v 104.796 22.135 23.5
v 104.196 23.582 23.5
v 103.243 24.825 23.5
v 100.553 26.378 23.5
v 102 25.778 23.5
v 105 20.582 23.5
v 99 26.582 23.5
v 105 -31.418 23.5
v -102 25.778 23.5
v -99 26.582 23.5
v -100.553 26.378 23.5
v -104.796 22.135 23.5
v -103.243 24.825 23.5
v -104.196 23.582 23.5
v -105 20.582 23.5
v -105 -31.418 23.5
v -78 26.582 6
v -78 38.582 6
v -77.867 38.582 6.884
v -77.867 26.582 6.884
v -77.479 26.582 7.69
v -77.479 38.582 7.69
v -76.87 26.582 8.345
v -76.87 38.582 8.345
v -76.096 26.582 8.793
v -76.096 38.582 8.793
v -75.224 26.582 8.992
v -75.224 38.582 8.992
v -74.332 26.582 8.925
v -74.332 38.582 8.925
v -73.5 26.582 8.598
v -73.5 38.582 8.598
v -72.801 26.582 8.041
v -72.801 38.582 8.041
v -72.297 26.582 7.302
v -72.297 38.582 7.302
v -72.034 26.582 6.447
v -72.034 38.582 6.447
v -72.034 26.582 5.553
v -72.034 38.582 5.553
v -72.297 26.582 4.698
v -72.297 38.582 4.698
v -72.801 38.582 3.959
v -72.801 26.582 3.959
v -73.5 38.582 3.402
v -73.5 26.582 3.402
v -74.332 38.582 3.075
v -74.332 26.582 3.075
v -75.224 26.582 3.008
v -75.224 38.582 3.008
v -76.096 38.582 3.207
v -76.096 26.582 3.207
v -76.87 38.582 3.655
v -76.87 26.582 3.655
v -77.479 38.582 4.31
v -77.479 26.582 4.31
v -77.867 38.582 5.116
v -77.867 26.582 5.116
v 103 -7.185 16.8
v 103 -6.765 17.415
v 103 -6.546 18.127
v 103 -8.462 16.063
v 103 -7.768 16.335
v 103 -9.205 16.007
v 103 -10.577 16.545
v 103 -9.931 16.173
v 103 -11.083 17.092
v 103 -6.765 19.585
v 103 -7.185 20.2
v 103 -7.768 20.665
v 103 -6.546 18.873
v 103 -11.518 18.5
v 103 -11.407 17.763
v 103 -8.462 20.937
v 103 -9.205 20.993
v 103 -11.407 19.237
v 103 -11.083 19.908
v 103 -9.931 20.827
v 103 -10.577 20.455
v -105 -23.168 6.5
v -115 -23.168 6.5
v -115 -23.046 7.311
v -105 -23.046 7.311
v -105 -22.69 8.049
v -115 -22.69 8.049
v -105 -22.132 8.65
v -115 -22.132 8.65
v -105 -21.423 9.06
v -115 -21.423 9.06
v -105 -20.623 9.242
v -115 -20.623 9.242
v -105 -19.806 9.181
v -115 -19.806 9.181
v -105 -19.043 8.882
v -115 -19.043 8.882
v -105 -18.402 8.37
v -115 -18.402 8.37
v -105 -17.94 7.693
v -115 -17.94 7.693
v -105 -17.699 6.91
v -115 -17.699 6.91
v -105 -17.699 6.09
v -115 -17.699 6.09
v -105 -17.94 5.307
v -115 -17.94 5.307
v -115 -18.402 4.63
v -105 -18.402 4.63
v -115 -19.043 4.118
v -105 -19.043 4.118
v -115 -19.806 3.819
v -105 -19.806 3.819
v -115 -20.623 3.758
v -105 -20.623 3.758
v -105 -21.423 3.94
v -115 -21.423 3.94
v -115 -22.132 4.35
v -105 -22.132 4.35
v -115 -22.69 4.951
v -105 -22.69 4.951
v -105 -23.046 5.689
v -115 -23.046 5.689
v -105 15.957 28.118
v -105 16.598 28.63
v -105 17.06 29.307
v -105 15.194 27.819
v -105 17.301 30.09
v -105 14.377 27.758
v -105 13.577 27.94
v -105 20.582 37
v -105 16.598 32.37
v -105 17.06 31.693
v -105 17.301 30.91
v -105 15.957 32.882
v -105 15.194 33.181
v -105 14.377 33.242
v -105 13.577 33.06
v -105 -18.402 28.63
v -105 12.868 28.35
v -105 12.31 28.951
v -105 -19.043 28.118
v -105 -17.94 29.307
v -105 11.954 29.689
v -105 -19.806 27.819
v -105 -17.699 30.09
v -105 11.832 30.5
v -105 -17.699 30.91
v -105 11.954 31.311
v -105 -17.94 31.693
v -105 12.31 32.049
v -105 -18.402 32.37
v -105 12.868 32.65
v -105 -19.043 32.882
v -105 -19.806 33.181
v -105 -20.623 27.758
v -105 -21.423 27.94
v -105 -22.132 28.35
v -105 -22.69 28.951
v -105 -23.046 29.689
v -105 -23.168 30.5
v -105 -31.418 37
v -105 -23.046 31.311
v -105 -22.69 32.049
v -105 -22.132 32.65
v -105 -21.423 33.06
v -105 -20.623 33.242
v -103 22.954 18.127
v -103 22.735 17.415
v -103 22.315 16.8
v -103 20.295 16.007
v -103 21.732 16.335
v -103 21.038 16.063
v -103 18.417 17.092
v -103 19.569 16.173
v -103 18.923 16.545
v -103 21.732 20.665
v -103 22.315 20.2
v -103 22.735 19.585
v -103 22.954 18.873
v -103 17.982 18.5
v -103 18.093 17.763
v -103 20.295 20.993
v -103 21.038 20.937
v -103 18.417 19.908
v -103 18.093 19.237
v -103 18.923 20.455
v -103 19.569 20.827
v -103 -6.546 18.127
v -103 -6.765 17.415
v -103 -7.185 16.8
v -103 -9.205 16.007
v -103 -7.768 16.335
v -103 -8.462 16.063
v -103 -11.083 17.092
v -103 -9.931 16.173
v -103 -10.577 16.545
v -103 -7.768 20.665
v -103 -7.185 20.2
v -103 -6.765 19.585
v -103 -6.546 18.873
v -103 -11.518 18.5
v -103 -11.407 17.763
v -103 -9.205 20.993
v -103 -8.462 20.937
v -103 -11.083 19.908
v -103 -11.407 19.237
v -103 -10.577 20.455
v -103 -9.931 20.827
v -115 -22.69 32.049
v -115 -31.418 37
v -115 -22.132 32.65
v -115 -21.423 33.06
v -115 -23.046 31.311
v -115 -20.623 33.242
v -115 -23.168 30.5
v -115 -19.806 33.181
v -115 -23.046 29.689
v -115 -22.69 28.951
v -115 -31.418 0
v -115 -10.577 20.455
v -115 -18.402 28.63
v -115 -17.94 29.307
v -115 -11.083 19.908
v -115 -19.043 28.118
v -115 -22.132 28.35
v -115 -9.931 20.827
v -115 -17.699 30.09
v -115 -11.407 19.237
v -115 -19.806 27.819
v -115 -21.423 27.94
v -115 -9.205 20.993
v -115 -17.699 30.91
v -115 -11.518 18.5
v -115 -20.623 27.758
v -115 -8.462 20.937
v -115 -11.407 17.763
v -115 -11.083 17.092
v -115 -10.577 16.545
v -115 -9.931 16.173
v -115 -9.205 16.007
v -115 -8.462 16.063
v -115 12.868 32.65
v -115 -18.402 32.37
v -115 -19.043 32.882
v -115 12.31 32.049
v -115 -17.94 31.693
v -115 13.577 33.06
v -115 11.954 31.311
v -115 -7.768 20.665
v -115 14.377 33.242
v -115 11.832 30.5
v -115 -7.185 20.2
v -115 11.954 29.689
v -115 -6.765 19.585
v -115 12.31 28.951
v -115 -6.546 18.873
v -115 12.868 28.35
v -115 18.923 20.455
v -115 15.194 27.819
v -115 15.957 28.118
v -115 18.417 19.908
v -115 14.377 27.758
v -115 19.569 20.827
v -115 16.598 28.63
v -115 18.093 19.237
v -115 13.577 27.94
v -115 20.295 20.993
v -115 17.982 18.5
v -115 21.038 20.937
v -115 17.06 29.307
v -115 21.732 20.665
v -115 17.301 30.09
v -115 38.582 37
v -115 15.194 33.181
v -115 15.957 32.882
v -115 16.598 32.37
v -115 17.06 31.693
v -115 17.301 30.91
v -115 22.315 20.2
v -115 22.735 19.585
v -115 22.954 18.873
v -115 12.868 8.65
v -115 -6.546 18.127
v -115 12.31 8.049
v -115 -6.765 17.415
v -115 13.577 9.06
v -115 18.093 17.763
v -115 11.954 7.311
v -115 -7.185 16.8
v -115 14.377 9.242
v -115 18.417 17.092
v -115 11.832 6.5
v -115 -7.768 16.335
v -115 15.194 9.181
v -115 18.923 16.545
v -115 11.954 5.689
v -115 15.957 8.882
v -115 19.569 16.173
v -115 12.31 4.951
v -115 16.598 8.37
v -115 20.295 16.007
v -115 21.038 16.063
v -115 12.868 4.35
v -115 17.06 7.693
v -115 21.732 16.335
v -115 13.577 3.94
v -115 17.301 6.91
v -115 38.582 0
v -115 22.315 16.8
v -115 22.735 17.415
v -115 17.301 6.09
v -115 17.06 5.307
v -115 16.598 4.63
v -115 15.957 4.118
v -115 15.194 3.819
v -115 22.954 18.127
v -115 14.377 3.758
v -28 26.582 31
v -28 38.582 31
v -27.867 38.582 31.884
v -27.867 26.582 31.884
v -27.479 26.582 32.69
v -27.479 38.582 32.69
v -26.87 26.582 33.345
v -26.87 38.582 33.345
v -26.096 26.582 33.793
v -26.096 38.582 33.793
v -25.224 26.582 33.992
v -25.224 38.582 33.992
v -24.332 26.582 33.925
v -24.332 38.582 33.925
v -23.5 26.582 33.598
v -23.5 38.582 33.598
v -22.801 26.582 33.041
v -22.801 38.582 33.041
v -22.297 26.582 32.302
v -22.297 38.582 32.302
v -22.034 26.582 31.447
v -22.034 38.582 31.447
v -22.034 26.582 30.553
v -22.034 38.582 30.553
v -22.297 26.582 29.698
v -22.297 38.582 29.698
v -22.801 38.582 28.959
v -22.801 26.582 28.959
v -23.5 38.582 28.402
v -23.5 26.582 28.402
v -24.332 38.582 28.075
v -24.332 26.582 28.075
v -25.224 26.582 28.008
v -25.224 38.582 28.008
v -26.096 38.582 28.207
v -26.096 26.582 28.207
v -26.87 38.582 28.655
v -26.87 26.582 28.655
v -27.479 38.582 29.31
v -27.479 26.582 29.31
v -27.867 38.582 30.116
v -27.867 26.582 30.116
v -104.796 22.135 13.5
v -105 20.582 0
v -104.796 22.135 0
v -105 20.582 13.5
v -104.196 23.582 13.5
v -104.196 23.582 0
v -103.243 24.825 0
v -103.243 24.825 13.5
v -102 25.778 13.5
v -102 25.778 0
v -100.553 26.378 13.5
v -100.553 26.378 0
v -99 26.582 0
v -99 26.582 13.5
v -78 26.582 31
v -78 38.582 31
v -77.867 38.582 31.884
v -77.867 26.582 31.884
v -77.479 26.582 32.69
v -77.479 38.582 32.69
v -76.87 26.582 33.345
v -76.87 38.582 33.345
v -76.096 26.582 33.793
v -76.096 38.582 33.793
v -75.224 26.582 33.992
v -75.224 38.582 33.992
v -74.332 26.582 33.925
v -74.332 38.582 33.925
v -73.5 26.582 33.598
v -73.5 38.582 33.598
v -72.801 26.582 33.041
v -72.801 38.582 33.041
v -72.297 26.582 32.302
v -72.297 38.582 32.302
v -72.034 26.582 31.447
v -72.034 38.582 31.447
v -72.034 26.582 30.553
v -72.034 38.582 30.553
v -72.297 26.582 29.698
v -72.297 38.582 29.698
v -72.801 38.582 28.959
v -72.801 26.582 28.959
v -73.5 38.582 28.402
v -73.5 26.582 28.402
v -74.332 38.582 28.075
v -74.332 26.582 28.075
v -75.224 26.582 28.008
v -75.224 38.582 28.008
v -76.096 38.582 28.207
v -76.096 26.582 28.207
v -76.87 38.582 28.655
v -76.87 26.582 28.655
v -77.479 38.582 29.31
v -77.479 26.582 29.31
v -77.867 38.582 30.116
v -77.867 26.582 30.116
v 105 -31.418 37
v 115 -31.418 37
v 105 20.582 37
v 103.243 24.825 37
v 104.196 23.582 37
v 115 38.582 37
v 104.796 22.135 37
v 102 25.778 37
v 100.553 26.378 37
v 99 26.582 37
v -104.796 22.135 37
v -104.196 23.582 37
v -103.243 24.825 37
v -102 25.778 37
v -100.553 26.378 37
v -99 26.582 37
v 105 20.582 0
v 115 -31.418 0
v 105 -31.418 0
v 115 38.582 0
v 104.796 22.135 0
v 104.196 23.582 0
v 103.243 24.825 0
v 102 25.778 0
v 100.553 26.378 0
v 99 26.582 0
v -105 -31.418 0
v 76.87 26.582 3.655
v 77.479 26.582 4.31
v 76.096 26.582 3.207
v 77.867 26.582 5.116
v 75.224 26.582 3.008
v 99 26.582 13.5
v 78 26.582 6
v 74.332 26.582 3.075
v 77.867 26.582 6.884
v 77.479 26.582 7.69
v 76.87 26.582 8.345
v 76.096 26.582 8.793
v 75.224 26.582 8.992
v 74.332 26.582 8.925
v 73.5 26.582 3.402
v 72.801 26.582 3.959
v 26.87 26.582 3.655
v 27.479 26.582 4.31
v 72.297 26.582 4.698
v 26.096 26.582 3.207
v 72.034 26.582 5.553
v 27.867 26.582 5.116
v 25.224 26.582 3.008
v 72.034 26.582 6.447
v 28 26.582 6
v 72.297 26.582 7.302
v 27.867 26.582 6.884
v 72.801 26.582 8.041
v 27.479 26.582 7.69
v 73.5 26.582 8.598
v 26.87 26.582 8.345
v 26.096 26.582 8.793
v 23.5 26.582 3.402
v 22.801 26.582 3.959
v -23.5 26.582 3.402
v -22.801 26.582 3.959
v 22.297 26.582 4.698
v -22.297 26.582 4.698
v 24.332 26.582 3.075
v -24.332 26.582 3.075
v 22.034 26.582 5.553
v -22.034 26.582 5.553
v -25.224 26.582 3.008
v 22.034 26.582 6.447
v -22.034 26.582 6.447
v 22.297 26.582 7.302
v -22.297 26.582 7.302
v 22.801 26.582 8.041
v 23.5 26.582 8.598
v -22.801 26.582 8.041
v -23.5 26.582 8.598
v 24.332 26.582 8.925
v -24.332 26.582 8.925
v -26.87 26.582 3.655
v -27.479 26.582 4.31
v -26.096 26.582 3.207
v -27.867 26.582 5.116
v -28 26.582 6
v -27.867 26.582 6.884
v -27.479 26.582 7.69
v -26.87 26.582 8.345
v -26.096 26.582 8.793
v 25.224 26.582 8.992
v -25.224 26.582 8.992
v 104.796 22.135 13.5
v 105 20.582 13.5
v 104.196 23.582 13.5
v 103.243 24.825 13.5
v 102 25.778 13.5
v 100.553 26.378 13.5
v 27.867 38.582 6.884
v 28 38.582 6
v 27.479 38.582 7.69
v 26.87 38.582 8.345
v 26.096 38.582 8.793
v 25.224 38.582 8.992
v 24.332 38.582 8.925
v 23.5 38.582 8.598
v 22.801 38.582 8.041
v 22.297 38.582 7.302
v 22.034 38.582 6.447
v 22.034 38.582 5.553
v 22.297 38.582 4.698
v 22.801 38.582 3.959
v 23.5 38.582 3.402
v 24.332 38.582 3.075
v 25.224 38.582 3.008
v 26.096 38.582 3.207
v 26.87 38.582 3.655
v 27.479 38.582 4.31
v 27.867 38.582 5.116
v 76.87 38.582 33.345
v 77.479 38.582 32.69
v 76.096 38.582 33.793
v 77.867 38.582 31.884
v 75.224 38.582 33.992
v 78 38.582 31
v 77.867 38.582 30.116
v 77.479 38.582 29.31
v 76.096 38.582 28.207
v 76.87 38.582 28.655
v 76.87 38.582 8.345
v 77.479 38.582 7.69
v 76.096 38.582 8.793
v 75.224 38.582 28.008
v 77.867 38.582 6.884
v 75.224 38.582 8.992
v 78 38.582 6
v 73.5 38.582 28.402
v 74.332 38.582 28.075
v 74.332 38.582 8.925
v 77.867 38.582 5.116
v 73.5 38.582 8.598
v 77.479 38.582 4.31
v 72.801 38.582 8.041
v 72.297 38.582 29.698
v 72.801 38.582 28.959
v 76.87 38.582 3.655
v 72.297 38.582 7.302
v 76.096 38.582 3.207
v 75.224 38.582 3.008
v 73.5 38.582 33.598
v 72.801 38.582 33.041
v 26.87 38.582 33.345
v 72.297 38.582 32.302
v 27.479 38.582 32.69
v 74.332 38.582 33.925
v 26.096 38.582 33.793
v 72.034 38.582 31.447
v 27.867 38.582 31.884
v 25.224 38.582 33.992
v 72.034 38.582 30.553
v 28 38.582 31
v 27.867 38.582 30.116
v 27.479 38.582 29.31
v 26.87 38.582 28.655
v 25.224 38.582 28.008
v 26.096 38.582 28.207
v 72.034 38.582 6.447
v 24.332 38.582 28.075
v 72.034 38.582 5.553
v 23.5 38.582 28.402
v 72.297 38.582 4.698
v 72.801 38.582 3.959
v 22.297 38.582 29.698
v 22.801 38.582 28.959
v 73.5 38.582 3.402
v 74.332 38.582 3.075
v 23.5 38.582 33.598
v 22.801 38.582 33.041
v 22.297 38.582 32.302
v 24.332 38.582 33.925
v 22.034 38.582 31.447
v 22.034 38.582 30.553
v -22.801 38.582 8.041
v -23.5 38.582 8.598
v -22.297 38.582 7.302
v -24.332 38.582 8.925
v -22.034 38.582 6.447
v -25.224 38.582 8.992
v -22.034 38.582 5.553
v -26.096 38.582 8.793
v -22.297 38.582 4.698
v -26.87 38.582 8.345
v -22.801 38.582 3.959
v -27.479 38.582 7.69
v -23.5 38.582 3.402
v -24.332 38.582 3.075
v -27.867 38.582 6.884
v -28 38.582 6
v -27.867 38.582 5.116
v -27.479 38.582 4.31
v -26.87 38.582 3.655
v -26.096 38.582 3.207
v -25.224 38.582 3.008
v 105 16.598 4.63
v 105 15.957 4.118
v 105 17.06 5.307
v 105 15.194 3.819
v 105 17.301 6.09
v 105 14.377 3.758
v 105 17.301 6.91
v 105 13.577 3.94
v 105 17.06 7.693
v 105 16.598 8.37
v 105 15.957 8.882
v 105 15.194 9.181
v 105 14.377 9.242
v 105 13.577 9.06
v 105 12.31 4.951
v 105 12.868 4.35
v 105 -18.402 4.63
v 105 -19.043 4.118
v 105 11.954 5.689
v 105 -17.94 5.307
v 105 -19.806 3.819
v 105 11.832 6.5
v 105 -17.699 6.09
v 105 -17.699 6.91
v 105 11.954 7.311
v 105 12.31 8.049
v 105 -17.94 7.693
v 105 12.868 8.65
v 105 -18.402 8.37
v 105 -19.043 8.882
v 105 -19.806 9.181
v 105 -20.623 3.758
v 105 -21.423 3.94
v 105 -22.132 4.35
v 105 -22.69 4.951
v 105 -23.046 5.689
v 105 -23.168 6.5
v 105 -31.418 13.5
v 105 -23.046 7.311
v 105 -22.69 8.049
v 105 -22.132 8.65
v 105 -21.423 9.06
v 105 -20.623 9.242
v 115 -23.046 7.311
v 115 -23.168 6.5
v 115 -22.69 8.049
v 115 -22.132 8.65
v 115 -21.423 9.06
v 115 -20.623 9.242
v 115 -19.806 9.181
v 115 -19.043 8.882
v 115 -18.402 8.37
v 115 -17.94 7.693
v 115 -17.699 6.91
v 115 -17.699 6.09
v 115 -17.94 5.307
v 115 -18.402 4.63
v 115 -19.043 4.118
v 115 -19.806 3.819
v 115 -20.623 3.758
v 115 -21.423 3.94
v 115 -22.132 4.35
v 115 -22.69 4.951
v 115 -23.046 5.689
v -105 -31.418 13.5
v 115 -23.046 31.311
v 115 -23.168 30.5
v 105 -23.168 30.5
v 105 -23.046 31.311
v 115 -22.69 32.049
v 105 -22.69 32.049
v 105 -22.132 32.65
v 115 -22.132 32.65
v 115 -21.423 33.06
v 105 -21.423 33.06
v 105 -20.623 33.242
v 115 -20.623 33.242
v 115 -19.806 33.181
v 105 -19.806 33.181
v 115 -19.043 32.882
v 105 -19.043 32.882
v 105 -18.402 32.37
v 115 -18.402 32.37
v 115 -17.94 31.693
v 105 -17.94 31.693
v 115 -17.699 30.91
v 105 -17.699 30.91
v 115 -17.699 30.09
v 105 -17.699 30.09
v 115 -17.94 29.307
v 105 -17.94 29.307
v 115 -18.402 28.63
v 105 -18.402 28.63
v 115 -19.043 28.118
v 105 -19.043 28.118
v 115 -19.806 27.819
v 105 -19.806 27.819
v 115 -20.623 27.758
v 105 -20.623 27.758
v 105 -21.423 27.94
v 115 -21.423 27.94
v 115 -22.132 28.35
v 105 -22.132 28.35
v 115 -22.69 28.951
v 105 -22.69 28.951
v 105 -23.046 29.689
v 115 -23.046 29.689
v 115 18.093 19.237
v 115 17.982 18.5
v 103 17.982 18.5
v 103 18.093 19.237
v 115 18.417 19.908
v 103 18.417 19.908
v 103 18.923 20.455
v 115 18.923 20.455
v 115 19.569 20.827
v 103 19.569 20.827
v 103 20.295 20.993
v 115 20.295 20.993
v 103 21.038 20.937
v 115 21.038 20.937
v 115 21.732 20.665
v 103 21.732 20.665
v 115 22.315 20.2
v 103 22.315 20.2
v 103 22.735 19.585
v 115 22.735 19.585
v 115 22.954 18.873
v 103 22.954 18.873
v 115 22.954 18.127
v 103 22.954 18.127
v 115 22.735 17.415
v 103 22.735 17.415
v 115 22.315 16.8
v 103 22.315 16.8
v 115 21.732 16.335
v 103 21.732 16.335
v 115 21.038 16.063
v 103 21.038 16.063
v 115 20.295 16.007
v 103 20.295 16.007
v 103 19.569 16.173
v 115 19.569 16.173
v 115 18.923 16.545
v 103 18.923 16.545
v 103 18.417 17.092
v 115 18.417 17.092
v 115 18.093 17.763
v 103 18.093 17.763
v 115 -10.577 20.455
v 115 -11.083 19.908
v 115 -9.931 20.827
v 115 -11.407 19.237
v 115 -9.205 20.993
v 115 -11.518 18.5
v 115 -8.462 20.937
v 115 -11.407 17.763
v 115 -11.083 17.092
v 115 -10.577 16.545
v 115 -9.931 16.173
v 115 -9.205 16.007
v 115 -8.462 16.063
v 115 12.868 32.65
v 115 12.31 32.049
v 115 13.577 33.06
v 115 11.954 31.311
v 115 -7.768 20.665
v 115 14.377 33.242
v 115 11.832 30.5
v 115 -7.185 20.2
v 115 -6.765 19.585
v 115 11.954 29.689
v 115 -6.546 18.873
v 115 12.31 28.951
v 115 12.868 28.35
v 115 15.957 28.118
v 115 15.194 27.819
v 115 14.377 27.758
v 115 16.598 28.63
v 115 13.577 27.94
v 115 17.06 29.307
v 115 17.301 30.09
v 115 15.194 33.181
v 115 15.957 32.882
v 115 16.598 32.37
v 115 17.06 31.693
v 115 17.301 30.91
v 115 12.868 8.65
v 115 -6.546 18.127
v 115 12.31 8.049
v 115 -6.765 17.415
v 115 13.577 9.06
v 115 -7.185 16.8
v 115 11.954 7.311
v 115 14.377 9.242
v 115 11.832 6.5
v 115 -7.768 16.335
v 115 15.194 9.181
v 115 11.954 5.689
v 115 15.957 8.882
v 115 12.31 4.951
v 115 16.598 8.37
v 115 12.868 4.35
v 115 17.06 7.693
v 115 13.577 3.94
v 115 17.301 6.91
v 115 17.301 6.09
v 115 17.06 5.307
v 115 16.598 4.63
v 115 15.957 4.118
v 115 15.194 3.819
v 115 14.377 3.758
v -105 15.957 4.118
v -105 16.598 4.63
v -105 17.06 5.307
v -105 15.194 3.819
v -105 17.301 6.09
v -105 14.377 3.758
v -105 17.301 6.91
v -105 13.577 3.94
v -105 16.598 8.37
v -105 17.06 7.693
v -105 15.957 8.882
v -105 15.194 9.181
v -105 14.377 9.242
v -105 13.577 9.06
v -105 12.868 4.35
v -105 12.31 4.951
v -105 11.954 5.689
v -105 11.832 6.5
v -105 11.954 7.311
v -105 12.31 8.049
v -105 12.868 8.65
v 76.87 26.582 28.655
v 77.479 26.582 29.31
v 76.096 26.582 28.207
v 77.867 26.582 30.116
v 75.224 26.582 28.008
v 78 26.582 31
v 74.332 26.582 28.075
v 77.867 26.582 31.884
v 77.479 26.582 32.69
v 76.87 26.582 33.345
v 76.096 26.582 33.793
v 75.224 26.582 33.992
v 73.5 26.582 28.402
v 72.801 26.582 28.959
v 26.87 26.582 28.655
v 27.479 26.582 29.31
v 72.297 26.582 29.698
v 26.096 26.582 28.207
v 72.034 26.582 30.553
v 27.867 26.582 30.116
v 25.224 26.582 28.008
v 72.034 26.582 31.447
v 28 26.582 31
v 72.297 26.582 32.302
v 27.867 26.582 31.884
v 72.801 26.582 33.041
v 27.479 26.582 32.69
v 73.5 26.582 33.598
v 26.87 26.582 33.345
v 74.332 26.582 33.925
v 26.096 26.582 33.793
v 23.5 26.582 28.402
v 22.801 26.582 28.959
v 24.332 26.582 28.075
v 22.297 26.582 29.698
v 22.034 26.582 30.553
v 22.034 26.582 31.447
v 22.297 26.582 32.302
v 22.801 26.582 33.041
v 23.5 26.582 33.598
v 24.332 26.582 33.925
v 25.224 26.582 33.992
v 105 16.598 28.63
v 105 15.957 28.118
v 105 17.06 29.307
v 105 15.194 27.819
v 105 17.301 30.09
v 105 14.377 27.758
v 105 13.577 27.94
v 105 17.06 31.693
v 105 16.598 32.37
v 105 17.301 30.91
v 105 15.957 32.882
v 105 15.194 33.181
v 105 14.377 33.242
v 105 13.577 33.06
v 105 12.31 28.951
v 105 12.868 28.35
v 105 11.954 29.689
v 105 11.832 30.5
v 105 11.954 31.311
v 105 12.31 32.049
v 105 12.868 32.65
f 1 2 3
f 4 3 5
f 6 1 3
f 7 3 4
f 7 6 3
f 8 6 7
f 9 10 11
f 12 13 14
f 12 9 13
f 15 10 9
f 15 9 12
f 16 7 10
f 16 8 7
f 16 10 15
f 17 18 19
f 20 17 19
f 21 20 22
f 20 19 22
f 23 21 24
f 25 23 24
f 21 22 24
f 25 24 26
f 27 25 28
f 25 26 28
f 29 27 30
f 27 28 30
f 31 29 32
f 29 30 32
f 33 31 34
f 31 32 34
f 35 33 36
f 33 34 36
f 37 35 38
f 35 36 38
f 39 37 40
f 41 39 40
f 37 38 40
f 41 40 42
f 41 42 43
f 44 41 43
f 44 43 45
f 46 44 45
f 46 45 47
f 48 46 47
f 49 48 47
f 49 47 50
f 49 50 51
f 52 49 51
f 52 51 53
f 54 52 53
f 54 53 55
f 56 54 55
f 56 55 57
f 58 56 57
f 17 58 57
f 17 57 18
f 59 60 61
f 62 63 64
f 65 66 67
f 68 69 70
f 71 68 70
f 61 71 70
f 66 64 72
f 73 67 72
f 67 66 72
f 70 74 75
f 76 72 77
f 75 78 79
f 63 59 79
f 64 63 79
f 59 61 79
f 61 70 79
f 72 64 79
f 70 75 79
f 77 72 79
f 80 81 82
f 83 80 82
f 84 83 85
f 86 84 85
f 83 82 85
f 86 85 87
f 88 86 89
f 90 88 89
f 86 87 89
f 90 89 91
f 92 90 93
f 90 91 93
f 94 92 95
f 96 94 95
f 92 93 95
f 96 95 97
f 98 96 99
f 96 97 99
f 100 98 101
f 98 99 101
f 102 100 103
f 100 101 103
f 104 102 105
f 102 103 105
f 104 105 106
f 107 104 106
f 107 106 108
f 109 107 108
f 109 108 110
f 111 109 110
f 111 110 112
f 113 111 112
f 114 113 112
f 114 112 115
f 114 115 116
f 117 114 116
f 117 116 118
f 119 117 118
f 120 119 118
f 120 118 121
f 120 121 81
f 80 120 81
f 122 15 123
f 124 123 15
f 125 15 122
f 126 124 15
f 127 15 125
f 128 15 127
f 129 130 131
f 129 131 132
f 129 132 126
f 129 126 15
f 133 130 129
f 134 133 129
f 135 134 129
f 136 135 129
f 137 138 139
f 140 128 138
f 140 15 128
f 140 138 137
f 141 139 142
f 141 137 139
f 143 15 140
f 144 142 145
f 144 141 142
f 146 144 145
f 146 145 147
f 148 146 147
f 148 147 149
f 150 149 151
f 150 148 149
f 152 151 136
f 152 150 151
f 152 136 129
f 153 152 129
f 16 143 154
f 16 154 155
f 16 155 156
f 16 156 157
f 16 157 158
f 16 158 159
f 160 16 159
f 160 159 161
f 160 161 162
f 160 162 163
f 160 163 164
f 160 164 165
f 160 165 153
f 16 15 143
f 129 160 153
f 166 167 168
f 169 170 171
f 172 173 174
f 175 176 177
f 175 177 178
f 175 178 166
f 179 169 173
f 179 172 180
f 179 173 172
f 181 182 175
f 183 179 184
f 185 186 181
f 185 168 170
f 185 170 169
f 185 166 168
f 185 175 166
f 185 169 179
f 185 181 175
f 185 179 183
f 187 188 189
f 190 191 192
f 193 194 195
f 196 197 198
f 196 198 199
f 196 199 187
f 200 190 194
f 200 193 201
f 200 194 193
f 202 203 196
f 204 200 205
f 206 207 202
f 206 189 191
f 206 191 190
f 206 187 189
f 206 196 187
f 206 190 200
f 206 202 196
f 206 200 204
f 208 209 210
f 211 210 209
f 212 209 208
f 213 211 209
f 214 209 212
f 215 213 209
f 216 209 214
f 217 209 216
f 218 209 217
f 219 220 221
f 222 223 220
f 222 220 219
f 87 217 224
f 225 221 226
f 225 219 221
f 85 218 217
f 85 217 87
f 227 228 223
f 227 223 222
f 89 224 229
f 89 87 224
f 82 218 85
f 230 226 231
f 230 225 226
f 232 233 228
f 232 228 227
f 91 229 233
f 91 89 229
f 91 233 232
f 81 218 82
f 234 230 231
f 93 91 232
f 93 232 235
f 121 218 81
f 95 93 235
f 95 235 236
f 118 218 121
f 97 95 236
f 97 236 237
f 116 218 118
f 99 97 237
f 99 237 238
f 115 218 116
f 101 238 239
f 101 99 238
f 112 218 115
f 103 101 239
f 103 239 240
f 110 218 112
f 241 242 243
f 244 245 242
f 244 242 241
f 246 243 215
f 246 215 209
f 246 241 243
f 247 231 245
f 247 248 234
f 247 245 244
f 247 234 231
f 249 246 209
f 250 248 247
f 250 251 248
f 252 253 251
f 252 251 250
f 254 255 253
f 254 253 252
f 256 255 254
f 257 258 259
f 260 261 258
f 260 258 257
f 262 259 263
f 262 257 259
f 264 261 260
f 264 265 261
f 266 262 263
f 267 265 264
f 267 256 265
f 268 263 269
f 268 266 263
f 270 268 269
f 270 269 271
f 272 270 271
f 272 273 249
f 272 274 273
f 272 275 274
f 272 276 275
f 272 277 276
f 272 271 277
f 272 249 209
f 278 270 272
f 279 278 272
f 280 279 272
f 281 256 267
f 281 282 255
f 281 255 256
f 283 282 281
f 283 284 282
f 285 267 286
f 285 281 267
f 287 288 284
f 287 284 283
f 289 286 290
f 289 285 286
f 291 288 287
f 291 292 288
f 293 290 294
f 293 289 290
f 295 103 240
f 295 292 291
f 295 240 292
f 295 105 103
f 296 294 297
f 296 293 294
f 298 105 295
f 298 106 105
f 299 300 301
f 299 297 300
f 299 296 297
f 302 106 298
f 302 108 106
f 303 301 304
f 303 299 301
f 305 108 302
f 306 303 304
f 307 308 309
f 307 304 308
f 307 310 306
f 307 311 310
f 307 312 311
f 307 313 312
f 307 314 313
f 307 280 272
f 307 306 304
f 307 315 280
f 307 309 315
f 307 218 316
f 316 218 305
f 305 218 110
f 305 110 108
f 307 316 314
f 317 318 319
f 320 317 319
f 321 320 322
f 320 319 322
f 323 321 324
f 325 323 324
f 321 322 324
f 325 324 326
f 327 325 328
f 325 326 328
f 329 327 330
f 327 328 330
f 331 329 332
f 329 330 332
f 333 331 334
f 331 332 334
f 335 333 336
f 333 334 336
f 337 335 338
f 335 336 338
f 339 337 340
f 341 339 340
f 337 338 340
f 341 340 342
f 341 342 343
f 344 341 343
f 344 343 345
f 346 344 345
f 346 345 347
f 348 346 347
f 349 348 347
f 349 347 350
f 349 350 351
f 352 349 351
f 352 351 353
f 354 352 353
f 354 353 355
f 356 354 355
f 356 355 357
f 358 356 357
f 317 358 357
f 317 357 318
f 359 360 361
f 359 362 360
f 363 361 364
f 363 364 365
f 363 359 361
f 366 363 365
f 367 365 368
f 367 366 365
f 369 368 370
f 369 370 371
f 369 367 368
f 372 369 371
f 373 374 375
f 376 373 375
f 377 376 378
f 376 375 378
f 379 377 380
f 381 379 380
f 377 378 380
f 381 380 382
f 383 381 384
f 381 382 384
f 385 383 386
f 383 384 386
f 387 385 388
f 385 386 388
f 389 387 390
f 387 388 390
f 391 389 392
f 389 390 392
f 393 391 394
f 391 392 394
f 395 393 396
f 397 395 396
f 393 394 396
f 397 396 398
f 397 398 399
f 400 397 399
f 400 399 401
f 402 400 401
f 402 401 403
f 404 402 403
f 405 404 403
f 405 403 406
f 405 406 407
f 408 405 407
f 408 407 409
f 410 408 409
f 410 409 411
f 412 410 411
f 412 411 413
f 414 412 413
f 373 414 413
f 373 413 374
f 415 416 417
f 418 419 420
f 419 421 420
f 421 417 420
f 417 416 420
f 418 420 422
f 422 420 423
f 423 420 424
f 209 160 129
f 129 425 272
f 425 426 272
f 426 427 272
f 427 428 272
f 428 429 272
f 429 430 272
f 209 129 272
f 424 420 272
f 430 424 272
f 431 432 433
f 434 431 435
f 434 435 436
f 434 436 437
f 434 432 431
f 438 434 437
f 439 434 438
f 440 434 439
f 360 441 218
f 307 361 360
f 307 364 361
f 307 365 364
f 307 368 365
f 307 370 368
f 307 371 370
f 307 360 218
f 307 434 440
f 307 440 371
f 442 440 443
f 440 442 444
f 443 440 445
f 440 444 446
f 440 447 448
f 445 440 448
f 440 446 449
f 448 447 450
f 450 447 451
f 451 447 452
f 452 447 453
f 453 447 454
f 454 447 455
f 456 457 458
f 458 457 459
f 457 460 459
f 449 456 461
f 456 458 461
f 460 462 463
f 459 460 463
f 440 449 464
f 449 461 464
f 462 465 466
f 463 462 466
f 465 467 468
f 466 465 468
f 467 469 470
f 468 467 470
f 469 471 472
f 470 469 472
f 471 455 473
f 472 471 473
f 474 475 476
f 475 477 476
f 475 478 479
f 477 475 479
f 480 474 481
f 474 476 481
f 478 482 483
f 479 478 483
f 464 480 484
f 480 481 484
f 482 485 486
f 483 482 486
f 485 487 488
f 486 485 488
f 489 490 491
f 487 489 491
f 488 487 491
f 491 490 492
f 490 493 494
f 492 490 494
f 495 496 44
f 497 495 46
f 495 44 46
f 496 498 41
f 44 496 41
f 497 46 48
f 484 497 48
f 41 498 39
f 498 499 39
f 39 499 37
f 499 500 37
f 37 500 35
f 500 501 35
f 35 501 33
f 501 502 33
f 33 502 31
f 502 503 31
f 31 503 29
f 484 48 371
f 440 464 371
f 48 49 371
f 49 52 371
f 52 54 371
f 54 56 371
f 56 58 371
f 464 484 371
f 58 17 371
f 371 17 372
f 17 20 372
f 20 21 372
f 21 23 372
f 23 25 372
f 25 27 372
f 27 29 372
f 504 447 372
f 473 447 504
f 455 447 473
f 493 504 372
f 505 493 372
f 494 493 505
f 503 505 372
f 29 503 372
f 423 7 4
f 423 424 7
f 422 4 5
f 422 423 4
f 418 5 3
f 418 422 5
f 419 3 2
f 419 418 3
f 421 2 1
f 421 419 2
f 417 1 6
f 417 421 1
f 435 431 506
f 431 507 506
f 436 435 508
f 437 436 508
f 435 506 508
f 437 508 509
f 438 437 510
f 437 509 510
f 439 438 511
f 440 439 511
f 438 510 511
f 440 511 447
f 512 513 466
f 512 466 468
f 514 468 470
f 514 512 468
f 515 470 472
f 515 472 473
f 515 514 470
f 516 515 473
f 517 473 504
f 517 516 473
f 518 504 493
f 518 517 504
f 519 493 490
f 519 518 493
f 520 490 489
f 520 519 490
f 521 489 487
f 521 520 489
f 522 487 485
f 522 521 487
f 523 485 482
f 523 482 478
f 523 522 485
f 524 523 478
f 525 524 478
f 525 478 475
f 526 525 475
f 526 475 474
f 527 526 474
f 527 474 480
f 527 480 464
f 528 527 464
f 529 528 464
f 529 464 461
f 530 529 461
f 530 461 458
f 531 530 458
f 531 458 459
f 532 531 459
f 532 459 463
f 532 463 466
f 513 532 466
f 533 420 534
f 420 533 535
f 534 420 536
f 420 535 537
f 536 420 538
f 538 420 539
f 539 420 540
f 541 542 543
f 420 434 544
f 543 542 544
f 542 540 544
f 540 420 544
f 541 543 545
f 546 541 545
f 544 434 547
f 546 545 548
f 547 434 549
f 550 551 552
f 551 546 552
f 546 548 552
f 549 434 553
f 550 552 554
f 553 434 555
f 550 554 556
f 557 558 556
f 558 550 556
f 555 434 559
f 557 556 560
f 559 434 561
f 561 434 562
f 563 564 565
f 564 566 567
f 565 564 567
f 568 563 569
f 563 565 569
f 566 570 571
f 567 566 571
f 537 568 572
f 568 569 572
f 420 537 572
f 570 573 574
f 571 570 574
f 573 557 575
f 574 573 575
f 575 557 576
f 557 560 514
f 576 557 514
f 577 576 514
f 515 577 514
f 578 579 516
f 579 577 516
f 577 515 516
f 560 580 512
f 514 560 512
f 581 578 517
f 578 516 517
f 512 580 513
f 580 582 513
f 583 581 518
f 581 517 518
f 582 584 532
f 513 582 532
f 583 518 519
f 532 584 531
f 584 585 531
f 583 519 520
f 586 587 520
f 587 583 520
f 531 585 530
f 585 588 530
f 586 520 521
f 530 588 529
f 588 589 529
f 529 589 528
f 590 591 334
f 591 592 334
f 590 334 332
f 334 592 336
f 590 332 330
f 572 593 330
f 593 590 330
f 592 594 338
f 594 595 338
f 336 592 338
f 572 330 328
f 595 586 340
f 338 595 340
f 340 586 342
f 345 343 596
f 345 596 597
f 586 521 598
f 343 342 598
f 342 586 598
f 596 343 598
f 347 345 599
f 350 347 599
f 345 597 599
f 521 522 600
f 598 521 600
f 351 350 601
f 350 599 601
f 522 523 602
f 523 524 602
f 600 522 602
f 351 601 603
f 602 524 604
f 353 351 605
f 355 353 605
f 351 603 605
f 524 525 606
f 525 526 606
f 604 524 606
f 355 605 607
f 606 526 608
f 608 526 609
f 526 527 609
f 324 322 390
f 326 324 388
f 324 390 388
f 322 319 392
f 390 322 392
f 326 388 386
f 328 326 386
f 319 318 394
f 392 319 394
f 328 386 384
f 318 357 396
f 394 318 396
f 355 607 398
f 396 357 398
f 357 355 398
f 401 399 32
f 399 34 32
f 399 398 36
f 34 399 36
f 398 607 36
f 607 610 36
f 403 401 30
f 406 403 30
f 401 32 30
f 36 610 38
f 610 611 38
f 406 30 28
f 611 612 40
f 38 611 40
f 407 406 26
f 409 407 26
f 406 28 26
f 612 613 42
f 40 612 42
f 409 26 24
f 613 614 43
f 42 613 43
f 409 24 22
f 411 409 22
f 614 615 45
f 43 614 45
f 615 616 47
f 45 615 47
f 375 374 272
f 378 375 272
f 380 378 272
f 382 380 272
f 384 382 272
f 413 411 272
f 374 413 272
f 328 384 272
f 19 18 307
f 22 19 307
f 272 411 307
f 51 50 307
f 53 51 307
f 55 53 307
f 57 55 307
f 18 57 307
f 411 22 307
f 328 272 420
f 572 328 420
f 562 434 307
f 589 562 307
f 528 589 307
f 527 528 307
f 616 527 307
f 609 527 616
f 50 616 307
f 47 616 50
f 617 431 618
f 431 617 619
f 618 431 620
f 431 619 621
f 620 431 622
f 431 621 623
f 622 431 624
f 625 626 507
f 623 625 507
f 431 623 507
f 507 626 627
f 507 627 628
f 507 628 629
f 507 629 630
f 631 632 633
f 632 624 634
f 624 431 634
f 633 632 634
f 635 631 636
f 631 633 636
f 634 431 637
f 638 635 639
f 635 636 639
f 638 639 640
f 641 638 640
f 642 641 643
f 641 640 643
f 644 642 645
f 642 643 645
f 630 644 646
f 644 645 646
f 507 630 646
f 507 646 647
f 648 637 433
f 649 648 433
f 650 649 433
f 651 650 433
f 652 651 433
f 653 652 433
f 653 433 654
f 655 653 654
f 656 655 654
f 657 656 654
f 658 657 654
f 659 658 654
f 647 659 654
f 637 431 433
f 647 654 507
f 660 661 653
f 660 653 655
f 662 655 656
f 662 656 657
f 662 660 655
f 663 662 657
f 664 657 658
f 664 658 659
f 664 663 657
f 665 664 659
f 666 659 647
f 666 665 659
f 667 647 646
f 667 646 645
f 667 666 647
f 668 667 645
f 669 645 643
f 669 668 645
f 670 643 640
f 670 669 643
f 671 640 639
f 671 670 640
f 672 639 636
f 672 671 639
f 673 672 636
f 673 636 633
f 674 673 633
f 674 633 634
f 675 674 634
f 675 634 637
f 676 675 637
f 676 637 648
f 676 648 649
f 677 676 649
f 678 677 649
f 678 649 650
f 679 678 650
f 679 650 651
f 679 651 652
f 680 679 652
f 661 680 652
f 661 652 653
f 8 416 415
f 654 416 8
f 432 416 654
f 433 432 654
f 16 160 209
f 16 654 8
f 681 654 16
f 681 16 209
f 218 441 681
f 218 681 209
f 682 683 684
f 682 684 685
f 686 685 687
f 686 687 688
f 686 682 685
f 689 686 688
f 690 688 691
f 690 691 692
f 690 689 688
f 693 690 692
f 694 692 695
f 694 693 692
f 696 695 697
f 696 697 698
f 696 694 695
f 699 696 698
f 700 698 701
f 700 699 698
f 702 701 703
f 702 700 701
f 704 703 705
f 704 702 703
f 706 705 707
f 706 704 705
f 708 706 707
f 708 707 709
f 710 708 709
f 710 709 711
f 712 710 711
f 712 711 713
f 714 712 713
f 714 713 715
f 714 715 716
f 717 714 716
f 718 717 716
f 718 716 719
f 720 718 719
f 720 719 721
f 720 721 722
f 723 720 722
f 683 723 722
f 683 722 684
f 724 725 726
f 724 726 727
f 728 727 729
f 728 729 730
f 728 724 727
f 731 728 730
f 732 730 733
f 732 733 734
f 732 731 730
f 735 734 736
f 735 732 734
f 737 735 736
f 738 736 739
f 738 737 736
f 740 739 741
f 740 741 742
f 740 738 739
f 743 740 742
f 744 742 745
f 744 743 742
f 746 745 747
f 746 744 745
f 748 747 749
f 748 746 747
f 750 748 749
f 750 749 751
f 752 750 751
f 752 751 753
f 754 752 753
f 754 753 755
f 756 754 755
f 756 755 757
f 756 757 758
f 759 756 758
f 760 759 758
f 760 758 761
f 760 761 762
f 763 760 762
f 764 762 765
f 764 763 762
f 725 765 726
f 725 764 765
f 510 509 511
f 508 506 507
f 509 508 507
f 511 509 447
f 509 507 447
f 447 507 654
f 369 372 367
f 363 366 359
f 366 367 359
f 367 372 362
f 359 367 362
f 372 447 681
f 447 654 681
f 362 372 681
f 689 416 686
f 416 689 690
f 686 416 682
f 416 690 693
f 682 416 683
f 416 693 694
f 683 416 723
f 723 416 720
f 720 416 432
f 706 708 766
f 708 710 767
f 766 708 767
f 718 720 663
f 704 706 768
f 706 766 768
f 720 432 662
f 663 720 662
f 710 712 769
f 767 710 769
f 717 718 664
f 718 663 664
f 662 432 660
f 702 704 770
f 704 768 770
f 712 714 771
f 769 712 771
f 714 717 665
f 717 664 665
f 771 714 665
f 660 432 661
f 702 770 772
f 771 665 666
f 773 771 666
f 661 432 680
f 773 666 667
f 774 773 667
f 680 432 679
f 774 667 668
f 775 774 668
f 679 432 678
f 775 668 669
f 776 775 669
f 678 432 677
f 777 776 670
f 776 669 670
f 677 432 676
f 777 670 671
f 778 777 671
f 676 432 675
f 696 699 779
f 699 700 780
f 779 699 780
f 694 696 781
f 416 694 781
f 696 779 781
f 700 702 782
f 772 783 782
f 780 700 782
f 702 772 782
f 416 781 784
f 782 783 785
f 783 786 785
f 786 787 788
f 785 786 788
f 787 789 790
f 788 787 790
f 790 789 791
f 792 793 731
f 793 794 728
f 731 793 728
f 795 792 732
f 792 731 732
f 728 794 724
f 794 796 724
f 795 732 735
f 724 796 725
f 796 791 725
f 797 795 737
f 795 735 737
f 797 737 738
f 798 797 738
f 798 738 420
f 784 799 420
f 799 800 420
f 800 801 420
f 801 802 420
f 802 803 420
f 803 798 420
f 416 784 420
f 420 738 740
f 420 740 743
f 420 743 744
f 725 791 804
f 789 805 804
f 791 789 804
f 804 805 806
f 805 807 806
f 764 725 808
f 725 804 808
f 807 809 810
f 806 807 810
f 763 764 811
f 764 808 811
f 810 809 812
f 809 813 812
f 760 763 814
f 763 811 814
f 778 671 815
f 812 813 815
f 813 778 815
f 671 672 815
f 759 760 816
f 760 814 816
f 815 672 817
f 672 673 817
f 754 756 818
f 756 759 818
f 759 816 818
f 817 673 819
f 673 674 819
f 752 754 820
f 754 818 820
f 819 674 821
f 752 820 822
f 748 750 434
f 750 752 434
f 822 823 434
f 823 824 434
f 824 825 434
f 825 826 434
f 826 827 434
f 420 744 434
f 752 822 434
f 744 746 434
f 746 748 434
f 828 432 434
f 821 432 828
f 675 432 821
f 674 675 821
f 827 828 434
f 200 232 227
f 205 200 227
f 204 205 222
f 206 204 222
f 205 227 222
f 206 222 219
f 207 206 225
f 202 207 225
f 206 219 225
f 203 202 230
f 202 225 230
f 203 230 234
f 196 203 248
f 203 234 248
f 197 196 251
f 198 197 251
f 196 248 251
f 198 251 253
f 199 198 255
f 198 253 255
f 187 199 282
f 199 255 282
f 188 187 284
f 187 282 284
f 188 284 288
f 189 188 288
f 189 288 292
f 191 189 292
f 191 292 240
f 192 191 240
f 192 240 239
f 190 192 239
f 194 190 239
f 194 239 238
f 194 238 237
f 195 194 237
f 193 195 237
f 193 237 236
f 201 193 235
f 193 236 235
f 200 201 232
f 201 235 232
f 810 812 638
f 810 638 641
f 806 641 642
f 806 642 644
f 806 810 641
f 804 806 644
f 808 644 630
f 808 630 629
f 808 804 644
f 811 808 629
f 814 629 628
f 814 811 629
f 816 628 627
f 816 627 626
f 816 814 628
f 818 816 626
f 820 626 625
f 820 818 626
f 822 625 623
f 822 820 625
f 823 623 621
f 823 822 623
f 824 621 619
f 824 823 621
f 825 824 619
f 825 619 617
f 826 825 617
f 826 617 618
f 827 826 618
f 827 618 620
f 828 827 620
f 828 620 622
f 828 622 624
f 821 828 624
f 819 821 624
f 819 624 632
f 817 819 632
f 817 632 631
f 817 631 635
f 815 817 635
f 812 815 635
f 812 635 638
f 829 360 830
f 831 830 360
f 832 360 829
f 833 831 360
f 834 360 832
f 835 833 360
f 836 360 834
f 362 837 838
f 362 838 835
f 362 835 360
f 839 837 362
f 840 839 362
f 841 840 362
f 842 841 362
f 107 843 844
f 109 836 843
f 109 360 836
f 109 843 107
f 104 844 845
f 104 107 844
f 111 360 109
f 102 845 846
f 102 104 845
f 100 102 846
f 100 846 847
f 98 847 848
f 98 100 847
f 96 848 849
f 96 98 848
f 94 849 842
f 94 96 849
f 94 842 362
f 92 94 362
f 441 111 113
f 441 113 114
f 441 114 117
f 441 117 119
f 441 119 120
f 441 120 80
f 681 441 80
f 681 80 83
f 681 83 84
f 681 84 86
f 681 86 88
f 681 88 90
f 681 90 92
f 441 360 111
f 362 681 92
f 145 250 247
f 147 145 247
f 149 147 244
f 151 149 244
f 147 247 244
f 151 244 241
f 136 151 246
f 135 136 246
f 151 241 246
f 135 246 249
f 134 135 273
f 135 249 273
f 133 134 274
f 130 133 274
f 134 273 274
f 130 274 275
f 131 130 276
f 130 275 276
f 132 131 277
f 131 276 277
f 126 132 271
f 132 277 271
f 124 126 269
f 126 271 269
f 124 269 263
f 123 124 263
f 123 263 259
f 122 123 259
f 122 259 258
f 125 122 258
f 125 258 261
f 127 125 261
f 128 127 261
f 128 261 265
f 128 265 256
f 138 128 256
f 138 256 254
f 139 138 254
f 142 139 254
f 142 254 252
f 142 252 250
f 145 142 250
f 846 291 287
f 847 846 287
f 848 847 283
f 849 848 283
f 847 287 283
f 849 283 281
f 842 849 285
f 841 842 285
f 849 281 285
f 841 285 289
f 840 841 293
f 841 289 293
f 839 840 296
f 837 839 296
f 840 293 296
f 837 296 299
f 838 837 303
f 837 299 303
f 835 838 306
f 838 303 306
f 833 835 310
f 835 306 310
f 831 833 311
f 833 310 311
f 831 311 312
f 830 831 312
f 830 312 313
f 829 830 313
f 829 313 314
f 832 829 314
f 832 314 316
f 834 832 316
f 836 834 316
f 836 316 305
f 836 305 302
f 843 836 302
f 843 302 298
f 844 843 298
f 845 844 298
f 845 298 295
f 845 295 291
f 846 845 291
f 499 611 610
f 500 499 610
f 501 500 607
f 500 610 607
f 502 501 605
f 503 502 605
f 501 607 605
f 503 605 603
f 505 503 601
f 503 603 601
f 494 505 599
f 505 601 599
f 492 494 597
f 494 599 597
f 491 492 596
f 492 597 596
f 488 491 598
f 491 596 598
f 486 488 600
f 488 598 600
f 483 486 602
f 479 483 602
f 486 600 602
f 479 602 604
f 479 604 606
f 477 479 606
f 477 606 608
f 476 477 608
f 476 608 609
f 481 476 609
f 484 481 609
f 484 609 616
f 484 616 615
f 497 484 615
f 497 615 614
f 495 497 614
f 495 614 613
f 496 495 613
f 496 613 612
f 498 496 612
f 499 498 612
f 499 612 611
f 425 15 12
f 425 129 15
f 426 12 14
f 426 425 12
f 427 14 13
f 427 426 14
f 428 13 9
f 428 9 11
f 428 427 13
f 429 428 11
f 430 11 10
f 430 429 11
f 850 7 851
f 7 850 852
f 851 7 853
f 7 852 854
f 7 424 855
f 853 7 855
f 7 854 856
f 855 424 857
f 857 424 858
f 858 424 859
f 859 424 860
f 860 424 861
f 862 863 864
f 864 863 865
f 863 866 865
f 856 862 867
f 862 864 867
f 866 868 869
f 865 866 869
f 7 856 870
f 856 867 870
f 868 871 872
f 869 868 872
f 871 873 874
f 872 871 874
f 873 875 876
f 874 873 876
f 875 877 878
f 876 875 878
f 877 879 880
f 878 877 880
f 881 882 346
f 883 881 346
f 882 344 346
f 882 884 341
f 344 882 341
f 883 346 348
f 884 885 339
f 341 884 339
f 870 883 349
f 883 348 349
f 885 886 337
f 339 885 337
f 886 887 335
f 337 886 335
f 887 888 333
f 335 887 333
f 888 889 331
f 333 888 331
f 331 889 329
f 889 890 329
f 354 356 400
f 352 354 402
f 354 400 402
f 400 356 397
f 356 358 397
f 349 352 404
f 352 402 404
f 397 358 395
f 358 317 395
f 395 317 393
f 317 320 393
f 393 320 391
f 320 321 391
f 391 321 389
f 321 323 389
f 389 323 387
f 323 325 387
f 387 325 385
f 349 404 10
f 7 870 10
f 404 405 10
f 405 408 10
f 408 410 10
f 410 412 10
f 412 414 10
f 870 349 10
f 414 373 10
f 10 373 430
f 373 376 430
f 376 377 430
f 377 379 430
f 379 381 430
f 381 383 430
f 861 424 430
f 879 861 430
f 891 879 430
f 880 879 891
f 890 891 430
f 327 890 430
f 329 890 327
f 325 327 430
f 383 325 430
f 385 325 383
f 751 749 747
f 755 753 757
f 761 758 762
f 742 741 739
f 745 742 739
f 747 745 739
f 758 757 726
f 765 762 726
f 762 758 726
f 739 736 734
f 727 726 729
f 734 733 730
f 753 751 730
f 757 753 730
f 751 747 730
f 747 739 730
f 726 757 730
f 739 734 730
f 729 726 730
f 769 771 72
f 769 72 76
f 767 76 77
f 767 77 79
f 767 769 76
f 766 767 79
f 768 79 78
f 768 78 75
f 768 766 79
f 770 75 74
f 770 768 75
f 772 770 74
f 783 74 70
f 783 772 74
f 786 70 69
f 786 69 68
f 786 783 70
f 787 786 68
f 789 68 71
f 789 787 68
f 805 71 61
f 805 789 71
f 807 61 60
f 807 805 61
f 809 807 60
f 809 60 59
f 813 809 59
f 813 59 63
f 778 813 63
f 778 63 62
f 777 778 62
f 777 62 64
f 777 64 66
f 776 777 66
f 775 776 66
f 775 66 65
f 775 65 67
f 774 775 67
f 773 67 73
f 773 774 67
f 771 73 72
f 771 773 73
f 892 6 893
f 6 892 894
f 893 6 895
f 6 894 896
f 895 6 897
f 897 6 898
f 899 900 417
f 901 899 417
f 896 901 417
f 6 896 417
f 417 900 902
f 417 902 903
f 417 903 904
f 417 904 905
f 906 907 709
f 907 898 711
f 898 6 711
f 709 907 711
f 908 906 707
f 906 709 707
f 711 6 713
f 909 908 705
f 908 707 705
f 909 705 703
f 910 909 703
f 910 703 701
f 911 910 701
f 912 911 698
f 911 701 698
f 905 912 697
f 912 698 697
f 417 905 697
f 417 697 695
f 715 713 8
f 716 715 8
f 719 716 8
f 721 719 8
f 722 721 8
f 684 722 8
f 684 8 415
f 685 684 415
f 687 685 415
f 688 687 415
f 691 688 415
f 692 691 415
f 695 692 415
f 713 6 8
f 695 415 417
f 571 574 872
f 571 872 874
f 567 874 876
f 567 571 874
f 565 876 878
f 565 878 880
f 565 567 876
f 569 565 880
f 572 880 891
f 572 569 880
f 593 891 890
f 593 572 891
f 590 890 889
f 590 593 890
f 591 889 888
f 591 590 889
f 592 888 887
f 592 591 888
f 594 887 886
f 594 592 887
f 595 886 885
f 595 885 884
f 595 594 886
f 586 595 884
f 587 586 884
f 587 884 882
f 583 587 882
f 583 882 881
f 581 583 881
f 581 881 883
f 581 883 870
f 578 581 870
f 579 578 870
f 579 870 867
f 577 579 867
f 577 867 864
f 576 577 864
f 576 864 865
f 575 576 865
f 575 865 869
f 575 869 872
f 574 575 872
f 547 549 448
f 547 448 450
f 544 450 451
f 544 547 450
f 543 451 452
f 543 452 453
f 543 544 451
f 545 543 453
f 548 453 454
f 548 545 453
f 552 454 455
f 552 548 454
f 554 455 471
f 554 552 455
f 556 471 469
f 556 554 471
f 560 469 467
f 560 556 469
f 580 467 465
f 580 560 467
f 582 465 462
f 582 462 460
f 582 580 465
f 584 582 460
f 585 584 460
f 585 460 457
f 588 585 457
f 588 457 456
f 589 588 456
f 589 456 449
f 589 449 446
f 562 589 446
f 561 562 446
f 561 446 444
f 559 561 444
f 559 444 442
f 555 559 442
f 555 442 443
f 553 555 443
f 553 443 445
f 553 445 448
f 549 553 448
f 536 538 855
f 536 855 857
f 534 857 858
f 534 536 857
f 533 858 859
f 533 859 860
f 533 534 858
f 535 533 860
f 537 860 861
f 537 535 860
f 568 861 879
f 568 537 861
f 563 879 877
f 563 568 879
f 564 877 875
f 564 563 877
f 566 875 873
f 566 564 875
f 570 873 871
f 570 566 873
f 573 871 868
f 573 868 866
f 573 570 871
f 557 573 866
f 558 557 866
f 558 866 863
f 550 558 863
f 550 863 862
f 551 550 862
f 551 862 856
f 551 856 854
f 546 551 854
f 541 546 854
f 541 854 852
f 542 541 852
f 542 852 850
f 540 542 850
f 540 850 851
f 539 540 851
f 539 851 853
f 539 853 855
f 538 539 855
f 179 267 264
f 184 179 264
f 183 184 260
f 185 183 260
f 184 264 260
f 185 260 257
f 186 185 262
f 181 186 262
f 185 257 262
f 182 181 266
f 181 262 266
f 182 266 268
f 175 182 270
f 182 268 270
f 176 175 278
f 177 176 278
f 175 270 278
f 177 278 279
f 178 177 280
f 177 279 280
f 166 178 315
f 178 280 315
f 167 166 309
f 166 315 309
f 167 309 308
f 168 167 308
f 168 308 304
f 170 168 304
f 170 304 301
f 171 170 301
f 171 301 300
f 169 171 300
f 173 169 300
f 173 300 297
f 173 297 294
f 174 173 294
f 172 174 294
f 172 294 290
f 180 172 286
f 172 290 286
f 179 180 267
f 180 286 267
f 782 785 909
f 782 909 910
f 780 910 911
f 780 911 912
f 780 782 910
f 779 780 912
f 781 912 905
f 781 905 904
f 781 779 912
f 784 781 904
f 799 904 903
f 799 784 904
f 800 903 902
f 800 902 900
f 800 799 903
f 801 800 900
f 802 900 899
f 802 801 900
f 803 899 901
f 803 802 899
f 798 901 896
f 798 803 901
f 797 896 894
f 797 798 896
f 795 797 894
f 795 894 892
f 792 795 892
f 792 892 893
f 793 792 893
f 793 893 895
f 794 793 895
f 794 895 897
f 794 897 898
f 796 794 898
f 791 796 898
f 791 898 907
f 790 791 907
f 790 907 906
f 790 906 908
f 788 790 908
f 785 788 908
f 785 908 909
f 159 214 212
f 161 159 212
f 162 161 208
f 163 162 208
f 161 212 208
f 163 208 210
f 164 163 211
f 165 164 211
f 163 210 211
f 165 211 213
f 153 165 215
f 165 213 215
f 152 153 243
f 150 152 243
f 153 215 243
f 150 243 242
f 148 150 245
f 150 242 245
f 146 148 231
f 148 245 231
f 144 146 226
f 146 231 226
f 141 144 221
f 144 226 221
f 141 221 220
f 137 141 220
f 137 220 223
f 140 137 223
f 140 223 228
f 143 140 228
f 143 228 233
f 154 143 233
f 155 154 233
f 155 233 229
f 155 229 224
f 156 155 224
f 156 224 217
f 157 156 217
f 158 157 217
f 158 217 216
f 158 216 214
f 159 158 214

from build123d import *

# Parameters (mm, degrees)
F0_W     = 115
F0_H     = 70
F1_DEPTH = 37
F2_R     = 2.75
F2_R_2   = 2.5
F3_DEPTH = 12
F4_W     = 105
F4_H     = 13.5
F5_DEPTH = 58
F6_R     = 3
F7_DEPTH = 70.001
F9_R     = 6


with BuildPart() as f1:
    # F0 (on Top) → F1 (new body)
    with BuildSketch(Plane.XY):
        with Locations((-57.5, 3.58214689)):
            Rectangle(F0_W, F0_H)
    extrude(amount=F1_DEPTH)

    # F2 (on face) → F3 (cut)
    with BuildSketch(Plane(origin=(-115, 0, 0), x_dir=(0, -1, 0), z_dir=(-1, 0, 0))):
        with Locations((-14.58214689, 30.5)):
            Circle(F2_R)
        with Locations((-14.58214689, 6.5)):
            Circle(F2_R)
        with Locations((20.41785311, 6.5)):
            Circle(F2_R)
        with Locations((20.41785311, 30.5)):
            Circle(F2_R)
        with Locations((-20.48214689, 18.5)):
            Circle(F2_R_2)
        with Locations((9.01785311, 18.5)):
            Circle(F2_R_2)
    extrude(amount=-F3_DEPTH, mode=Mode.SUBTRACT)

    # F4 (on face) → F5 (cut)
    with BuildSketch(Plane.XZ.offset(31.41785311)):
        with Locations((-52.5, 6.75)):
            Rectangle(F4_W, F4_H)
        with Locations((-52.5, 30.25)):
            Rectangle(F4_W, F4_H)
    extrude(amount=-F5_DEPTH, mode=Mode.SUBTRACT)

    # F6 (on face) → F7 (cut, through all)
    with BuildSketch(Plane(origin=(0, 38.58214689, 0), x_dir=(-1, 0, 0), z_dir=(0, 1, 0))):
        with Locations((75, 6)):
            Circle(F6_R)
        with Locations((75, 31)):
            Circle(F6_R)
        with Locations((25, 31)):
            Circle(F6_R)
        with Locations((25, 6)):
            Circle(F6_R)
    extrude(amount=-F7_DEPTH, mode=Mode.SUBTRACT)

    # F8: F1 across plane


with BuildPart() as f1_1:
    add(f1.part)
    add(f1.part.mirror(Plane.YZ))

    # F9
    f9_edges = [f1_1.edges().sort_by_distance(p)[0] for p in [
        (-105, 26.582147, 6.75),
        (105, 26.582147, 6.75),
        (-105, 26.582147, 30.25),
        (105, 26.582147, 30.25),
    ]]
    fillet(f9_edges, radius=F9_R)


solid = f1_1.part
